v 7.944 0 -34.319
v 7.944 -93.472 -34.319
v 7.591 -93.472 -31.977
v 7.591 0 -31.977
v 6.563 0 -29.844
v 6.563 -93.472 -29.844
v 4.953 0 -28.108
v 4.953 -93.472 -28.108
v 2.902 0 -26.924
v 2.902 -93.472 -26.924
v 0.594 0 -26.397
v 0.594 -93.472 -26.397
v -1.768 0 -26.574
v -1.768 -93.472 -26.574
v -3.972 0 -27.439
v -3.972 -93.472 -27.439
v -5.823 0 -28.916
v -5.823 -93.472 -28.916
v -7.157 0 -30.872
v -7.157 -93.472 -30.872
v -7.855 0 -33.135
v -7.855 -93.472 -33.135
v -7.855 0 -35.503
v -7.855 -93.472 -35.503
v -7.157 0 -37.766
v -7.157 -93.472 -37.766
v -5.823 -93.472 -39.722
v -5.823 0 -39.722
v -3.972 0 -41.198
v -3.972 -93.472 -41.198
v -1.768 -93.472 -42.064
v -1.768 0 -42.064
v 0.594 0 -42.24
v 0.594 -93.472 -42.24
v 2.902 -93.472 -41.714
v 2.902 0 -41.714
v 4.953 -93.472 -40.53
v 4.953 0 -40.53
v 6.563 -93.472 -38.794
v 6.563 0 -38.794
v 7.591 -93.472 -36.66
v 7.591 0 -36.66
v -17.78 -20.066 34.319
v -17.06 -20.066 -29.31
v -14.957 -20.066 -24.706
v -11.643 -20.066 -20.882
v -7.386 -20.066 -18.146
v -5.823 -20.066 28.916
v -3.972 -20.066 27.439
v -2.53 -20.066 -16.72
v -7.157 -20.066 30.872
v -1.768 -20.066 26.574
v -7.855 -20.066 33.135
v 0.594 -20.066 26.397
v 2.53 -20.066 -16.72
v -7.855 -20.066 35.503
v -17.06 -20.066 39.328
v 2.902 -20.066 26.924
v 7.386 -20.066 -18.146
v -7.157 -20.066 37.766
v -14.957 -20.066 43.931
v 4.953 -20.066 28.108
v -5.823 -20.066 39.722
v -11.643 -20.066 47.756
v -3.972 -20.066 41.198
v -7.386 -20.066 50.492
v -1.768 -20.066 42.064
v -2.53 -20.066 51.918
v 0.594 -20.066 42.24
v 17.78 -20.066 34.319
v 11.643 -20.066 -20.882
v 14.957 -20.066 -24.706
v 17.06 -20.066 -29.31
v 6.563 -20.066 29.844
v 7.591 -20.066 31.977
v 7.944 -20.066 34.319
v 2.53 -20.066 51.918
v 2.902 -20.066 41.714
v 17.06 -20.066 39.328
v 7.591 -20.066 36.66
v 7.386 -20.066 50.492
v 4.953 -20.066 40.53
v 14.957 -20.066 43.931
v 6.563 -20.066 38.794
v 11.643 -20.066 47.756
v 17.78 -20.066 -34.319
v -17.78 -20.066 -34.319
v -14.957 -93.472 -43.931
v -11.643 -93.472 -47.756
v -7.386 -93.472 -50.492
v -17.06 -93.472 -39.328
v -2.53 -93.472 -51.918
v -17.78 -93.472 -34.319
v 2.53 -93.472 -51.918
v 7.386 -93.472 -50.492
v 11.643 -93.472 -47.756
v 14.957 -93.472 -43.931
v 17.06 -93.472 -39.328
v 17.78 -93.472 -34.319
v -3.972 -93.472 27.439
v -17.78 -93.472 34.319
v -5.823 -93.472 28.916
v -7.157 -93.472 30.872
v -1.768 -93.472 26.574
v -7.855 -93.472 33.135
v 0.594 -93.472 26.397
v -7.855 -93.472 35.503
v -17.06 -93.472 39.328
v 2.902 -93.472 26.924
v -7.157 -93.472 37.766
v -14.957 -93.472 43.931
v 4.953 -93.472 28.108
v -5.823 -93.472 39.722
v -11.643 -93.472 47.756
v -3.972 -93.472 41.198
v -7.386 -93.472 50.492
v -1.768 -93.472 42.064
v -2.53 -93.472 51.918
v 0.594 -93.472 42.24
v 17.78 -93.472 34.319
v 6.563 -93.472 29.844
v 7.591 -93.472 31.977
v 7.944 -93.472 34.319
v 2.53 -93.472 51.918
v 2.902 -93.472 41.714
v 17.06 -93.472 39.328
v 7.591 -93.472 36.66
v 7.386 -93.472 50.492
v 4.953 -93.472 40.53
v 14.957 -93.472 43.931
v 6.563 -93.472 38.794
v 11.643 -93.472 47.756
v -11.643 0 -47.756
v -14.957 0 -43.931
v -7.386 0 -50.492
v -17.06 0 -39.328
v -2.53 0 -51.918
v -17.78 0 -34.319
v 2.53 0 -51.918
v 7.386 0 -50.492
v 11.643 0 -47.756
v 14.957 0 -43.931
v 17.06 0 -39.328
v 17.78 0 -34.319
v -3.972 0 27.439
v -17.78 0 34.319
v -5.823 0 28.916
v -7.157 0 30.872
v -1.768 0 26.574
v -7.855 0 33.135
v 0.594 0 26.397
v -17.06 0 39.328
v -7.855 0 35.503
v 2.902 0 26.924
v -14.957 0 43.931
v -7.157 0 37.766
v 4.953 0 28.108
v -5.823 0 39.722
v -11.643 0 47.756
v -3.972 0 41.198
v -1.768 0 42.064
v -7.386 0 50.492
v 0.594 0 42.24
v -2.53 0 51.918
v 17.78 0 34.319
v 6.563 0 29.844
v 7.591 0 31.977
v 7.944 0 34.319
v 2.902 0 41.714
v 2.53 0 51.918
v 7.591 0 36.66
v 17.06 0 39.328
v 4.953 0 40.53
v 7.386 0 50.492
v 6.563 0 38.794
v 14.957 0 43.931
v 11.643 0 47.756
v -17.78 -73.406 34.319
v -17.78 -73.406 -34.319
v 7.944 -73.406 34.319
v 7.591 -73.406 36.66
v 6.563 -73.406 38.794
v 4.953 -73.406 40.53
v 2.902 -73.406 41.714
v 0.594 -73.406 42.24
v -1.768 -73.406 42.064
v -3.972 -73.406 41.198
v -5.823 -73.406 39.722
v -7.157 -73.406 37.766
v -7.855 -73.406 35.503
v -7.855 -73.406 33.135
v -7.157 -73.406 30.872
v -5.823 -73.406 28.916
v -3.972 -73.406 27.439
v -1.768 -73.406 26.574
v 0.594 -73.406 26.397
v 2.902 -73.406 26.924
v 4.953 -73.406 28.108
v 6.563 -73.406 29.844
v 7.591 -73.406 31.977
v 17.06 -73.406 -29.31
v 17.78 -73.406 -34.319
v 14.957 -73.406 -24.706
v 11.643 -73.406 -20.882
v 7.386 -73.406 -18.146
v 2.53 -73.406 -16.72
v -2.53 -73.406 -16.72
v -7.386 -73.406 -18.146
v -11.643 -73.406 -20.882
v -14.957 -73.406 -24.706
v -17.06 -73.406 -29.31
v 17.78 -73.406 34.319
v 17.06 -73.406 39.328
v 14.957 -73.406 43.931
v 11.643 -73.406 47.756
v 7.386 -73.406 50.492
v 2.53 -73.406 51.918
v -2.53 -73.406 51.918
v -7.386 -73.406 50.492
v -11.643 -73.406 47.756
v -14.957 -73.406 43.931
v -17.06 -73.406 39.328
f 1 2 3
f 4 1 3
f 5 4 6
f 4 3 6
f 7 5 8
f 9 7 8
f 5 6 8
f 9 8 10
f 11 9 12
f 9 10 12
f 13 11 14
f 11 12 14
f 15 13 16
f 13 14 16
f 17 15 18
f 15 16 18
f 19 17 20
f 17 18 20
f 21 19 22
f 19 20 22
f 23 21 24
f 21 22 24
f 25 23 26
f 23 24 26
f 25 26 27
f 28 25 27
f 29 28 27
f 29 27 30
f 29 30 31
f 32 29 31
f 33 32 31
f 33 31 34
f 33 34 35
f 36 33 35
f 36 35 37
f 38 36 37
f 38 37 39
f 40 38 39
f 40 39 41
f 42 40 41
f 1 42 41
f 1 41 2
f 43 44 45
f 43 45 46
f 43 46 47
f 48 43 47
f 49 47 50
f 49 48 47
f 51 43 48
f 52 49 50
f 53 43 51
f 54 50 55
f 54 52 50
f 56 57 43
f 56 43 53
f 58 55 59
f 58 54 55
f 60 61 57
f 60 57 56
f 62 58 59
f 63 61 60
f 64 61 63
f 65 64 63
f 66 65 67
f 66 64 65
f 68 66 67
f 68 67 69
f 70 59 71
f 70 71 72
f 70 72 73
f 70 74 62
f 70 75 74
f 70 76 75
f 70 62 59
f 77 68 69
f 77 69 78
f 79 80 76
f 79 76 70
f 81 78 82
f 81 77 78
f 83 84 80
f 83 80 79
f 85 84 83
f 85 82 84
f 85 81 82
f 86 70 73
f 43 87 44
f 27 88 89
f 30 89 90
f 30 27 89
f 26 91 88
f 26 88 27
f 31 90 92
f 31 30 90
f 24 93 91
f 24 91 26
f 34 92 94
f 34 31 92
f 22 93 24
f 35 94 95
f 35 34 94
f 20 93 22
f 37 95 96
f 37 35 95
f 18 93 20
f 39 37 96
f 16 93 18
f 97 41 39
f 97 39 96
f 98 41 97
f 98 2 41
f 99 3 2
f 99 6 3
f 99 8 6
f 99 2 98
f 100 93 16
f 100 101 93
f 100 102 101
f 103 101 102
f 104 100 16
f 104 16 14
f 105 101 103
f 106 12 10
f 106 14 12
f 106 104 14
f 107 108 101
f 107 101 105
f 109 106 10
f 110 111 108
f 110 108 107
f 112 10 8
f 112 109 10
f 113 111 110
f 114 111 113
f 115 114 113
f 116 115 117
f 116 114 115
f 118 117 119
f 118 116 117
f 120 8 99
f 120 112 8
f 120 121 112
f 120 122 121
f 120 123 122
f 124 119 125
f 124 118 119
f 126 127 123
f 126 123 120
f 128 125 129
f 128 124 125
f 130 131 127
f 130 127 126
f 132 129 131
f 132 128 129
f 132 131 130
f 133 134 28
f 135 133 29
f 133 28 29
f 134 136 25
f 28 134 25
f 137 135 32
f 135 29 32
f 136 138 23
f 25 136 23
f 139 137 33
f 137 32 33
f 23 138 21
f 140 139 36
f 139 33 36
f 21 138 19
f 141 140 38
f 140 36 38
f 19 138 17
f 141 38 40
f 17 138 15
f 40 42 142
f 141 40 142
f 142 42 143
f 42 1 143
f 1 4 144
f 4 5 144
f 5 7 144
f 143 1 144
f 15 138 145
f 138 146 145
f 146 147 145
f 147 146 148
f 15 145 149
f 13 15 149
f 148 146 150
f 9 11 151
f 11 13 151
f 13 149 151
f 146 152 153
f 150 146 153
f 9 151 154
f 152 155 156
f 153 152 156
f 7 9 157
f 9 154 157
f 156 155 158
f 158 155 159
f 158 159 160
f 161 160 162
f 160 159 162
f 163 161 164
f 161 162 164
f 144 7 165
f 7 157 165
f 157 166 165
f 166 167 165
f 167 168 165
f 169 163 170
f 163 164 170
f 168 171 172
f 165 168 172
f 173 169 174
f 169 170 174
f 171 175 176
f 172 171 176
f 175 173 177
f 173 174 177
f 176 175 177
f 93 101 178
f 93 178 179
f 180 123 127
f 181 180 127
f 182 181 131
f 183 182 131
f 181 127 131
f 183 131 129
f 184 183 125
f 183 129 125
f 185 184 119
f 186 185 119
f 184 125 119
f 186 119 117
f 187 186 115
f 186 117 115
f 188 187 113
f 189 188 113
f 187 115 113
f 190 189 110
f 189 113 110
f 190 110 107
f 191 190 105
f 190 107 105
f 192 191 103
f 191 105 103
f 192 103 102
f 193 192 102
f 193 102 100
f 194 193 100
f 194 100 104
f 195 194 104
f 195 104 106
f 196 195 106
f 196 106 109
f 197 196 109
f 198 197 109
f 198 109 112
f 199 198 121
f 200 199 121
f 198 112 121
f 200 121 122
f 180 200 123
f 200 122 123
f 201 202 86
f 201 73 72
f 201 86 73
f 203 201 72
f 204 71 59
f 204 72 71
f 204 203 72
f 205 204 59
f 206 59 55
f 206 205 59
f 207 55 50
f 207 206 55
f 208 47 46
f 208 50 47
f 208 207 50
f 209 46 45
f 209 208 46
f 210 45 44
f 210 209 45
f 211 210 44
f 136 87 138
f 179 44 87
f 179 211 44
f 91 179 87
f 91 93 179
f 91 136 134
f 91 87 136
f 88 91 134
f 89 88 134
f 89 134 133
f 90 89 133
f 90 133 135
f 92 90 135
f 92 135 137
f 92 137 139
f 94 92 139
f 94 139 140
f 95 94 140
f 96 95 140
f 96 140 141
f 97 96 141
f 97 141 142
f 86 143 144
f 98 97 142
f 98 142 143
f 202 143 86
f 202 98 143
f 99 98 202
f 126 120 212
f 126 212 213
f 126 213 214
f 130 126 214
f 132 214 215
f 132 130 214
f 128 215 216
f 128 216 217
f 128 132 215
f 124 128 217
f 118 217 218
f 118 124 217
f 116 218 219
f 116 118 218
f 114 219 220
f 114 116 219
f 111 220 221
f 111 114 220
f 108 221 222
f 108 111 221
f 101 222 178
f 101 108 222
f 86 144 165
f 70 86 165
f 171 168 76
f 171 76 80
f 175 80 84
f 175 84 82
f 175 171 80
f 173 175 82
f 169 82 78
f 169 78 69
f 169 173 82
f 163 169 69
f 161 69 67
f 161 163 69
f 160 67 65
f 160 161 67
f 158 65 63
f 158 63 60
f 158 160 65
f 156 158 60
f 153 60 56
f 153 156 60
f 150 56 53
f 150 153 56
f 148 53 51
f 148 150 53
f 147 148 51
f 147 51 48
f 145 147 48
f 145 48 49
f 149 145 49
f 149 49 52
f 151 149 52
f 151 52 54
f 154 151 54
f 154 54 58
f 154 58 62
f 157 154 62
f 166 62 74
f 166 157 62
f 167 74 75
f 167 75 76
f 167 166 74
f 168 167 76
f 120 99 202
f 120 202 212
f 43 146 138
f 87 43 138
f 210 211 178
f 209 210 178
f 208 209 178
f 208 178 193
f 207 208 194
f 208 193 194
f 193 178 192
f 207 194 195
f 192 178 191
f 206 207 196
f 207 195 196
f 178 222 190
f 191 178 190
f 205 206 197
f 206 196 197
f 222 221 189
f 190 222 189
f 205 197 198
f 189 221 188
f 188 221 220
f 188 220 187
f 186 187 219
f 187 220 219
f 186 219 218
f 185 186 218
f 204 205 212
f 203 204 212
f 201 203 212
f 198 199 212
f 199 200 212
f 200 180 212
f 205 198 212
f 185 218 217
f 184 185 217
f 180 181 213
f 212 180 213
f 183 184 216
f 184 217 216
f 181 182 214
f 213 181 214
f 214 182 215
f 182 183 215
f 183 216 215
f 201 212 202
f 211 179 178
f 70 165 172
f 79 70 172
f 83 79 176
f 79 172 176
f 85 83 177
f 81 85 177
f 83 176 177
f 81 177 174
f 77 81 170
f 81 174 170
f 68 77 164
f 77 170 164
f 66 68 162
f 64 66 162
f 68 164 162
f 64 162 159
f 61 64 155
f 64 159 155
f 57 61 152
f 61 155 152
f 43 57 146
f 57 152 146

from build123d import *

# Parameters (mm, degrees)
F0_R     = 7.943812
F1_DEPTH = 20.066
F2_DEPTH = 46.736


with BuildPart() as f1:
    # F0 (on Front) → F1 (new body)
    with BuildSketch(Plane.XZ):
        with BuildLine():
            Line((17.78, -34.318883), (17.78, 34.318883))
            ThreePointArc((17.78, 34.318883), (0, 52.098883), (-17.78, 34.318883))
            Line((-17.78, 34.318883), (-17.78, -34.318883))
            ThreePointArc((-17.78, -34.318883), (0, -16.538883), (17.78, -34.318883))
        make_face()
        with Locations((0, 34.318883)):
            Circle(F0_R, mode=Mode.SUBTRACT)
        with BuildLine():
            ThreePointArc((-17.78, -34.318883), (0, -52.098883), (17.78, -34.318883))
            ThreePointArc((17.78, -34.318883), (0, -16.538883), (-17.78, -34.318883))
        make_face()
        with Locations((0, -34.318883)):
            Circle(F0_R, mode=Mode.SUBTRACT)
    extrude(amount=F1_DEPTH)

    # F0 (on Front) → F2 (join)
    with BuildSketch(Plane.XZ):
        with BuildLine():
            ThreePointArc((-17.78, -34.318883), (0, -52.098883), (17.78, -34.318883))
            ThreePointArc((17.78, -34.318883), (0, -16.538883), (-17.78, -34.318883))
        make_face()
        with Locations((0, -34.318883)):
            Circle(F0_R, mode=Mode.SUBTRACT)
    extrude(amount=F2_DEPTH)

    # F4: F1 across plane


with BuildPart() as f1_1:
    add(f1.part)
    add(f1.part.mirror(Plane(origin=(0, -46.736, -34.318883), x_dir=(1, 0, 0), z_dir=(0, -1, 0))))


solid = f1_1.part
